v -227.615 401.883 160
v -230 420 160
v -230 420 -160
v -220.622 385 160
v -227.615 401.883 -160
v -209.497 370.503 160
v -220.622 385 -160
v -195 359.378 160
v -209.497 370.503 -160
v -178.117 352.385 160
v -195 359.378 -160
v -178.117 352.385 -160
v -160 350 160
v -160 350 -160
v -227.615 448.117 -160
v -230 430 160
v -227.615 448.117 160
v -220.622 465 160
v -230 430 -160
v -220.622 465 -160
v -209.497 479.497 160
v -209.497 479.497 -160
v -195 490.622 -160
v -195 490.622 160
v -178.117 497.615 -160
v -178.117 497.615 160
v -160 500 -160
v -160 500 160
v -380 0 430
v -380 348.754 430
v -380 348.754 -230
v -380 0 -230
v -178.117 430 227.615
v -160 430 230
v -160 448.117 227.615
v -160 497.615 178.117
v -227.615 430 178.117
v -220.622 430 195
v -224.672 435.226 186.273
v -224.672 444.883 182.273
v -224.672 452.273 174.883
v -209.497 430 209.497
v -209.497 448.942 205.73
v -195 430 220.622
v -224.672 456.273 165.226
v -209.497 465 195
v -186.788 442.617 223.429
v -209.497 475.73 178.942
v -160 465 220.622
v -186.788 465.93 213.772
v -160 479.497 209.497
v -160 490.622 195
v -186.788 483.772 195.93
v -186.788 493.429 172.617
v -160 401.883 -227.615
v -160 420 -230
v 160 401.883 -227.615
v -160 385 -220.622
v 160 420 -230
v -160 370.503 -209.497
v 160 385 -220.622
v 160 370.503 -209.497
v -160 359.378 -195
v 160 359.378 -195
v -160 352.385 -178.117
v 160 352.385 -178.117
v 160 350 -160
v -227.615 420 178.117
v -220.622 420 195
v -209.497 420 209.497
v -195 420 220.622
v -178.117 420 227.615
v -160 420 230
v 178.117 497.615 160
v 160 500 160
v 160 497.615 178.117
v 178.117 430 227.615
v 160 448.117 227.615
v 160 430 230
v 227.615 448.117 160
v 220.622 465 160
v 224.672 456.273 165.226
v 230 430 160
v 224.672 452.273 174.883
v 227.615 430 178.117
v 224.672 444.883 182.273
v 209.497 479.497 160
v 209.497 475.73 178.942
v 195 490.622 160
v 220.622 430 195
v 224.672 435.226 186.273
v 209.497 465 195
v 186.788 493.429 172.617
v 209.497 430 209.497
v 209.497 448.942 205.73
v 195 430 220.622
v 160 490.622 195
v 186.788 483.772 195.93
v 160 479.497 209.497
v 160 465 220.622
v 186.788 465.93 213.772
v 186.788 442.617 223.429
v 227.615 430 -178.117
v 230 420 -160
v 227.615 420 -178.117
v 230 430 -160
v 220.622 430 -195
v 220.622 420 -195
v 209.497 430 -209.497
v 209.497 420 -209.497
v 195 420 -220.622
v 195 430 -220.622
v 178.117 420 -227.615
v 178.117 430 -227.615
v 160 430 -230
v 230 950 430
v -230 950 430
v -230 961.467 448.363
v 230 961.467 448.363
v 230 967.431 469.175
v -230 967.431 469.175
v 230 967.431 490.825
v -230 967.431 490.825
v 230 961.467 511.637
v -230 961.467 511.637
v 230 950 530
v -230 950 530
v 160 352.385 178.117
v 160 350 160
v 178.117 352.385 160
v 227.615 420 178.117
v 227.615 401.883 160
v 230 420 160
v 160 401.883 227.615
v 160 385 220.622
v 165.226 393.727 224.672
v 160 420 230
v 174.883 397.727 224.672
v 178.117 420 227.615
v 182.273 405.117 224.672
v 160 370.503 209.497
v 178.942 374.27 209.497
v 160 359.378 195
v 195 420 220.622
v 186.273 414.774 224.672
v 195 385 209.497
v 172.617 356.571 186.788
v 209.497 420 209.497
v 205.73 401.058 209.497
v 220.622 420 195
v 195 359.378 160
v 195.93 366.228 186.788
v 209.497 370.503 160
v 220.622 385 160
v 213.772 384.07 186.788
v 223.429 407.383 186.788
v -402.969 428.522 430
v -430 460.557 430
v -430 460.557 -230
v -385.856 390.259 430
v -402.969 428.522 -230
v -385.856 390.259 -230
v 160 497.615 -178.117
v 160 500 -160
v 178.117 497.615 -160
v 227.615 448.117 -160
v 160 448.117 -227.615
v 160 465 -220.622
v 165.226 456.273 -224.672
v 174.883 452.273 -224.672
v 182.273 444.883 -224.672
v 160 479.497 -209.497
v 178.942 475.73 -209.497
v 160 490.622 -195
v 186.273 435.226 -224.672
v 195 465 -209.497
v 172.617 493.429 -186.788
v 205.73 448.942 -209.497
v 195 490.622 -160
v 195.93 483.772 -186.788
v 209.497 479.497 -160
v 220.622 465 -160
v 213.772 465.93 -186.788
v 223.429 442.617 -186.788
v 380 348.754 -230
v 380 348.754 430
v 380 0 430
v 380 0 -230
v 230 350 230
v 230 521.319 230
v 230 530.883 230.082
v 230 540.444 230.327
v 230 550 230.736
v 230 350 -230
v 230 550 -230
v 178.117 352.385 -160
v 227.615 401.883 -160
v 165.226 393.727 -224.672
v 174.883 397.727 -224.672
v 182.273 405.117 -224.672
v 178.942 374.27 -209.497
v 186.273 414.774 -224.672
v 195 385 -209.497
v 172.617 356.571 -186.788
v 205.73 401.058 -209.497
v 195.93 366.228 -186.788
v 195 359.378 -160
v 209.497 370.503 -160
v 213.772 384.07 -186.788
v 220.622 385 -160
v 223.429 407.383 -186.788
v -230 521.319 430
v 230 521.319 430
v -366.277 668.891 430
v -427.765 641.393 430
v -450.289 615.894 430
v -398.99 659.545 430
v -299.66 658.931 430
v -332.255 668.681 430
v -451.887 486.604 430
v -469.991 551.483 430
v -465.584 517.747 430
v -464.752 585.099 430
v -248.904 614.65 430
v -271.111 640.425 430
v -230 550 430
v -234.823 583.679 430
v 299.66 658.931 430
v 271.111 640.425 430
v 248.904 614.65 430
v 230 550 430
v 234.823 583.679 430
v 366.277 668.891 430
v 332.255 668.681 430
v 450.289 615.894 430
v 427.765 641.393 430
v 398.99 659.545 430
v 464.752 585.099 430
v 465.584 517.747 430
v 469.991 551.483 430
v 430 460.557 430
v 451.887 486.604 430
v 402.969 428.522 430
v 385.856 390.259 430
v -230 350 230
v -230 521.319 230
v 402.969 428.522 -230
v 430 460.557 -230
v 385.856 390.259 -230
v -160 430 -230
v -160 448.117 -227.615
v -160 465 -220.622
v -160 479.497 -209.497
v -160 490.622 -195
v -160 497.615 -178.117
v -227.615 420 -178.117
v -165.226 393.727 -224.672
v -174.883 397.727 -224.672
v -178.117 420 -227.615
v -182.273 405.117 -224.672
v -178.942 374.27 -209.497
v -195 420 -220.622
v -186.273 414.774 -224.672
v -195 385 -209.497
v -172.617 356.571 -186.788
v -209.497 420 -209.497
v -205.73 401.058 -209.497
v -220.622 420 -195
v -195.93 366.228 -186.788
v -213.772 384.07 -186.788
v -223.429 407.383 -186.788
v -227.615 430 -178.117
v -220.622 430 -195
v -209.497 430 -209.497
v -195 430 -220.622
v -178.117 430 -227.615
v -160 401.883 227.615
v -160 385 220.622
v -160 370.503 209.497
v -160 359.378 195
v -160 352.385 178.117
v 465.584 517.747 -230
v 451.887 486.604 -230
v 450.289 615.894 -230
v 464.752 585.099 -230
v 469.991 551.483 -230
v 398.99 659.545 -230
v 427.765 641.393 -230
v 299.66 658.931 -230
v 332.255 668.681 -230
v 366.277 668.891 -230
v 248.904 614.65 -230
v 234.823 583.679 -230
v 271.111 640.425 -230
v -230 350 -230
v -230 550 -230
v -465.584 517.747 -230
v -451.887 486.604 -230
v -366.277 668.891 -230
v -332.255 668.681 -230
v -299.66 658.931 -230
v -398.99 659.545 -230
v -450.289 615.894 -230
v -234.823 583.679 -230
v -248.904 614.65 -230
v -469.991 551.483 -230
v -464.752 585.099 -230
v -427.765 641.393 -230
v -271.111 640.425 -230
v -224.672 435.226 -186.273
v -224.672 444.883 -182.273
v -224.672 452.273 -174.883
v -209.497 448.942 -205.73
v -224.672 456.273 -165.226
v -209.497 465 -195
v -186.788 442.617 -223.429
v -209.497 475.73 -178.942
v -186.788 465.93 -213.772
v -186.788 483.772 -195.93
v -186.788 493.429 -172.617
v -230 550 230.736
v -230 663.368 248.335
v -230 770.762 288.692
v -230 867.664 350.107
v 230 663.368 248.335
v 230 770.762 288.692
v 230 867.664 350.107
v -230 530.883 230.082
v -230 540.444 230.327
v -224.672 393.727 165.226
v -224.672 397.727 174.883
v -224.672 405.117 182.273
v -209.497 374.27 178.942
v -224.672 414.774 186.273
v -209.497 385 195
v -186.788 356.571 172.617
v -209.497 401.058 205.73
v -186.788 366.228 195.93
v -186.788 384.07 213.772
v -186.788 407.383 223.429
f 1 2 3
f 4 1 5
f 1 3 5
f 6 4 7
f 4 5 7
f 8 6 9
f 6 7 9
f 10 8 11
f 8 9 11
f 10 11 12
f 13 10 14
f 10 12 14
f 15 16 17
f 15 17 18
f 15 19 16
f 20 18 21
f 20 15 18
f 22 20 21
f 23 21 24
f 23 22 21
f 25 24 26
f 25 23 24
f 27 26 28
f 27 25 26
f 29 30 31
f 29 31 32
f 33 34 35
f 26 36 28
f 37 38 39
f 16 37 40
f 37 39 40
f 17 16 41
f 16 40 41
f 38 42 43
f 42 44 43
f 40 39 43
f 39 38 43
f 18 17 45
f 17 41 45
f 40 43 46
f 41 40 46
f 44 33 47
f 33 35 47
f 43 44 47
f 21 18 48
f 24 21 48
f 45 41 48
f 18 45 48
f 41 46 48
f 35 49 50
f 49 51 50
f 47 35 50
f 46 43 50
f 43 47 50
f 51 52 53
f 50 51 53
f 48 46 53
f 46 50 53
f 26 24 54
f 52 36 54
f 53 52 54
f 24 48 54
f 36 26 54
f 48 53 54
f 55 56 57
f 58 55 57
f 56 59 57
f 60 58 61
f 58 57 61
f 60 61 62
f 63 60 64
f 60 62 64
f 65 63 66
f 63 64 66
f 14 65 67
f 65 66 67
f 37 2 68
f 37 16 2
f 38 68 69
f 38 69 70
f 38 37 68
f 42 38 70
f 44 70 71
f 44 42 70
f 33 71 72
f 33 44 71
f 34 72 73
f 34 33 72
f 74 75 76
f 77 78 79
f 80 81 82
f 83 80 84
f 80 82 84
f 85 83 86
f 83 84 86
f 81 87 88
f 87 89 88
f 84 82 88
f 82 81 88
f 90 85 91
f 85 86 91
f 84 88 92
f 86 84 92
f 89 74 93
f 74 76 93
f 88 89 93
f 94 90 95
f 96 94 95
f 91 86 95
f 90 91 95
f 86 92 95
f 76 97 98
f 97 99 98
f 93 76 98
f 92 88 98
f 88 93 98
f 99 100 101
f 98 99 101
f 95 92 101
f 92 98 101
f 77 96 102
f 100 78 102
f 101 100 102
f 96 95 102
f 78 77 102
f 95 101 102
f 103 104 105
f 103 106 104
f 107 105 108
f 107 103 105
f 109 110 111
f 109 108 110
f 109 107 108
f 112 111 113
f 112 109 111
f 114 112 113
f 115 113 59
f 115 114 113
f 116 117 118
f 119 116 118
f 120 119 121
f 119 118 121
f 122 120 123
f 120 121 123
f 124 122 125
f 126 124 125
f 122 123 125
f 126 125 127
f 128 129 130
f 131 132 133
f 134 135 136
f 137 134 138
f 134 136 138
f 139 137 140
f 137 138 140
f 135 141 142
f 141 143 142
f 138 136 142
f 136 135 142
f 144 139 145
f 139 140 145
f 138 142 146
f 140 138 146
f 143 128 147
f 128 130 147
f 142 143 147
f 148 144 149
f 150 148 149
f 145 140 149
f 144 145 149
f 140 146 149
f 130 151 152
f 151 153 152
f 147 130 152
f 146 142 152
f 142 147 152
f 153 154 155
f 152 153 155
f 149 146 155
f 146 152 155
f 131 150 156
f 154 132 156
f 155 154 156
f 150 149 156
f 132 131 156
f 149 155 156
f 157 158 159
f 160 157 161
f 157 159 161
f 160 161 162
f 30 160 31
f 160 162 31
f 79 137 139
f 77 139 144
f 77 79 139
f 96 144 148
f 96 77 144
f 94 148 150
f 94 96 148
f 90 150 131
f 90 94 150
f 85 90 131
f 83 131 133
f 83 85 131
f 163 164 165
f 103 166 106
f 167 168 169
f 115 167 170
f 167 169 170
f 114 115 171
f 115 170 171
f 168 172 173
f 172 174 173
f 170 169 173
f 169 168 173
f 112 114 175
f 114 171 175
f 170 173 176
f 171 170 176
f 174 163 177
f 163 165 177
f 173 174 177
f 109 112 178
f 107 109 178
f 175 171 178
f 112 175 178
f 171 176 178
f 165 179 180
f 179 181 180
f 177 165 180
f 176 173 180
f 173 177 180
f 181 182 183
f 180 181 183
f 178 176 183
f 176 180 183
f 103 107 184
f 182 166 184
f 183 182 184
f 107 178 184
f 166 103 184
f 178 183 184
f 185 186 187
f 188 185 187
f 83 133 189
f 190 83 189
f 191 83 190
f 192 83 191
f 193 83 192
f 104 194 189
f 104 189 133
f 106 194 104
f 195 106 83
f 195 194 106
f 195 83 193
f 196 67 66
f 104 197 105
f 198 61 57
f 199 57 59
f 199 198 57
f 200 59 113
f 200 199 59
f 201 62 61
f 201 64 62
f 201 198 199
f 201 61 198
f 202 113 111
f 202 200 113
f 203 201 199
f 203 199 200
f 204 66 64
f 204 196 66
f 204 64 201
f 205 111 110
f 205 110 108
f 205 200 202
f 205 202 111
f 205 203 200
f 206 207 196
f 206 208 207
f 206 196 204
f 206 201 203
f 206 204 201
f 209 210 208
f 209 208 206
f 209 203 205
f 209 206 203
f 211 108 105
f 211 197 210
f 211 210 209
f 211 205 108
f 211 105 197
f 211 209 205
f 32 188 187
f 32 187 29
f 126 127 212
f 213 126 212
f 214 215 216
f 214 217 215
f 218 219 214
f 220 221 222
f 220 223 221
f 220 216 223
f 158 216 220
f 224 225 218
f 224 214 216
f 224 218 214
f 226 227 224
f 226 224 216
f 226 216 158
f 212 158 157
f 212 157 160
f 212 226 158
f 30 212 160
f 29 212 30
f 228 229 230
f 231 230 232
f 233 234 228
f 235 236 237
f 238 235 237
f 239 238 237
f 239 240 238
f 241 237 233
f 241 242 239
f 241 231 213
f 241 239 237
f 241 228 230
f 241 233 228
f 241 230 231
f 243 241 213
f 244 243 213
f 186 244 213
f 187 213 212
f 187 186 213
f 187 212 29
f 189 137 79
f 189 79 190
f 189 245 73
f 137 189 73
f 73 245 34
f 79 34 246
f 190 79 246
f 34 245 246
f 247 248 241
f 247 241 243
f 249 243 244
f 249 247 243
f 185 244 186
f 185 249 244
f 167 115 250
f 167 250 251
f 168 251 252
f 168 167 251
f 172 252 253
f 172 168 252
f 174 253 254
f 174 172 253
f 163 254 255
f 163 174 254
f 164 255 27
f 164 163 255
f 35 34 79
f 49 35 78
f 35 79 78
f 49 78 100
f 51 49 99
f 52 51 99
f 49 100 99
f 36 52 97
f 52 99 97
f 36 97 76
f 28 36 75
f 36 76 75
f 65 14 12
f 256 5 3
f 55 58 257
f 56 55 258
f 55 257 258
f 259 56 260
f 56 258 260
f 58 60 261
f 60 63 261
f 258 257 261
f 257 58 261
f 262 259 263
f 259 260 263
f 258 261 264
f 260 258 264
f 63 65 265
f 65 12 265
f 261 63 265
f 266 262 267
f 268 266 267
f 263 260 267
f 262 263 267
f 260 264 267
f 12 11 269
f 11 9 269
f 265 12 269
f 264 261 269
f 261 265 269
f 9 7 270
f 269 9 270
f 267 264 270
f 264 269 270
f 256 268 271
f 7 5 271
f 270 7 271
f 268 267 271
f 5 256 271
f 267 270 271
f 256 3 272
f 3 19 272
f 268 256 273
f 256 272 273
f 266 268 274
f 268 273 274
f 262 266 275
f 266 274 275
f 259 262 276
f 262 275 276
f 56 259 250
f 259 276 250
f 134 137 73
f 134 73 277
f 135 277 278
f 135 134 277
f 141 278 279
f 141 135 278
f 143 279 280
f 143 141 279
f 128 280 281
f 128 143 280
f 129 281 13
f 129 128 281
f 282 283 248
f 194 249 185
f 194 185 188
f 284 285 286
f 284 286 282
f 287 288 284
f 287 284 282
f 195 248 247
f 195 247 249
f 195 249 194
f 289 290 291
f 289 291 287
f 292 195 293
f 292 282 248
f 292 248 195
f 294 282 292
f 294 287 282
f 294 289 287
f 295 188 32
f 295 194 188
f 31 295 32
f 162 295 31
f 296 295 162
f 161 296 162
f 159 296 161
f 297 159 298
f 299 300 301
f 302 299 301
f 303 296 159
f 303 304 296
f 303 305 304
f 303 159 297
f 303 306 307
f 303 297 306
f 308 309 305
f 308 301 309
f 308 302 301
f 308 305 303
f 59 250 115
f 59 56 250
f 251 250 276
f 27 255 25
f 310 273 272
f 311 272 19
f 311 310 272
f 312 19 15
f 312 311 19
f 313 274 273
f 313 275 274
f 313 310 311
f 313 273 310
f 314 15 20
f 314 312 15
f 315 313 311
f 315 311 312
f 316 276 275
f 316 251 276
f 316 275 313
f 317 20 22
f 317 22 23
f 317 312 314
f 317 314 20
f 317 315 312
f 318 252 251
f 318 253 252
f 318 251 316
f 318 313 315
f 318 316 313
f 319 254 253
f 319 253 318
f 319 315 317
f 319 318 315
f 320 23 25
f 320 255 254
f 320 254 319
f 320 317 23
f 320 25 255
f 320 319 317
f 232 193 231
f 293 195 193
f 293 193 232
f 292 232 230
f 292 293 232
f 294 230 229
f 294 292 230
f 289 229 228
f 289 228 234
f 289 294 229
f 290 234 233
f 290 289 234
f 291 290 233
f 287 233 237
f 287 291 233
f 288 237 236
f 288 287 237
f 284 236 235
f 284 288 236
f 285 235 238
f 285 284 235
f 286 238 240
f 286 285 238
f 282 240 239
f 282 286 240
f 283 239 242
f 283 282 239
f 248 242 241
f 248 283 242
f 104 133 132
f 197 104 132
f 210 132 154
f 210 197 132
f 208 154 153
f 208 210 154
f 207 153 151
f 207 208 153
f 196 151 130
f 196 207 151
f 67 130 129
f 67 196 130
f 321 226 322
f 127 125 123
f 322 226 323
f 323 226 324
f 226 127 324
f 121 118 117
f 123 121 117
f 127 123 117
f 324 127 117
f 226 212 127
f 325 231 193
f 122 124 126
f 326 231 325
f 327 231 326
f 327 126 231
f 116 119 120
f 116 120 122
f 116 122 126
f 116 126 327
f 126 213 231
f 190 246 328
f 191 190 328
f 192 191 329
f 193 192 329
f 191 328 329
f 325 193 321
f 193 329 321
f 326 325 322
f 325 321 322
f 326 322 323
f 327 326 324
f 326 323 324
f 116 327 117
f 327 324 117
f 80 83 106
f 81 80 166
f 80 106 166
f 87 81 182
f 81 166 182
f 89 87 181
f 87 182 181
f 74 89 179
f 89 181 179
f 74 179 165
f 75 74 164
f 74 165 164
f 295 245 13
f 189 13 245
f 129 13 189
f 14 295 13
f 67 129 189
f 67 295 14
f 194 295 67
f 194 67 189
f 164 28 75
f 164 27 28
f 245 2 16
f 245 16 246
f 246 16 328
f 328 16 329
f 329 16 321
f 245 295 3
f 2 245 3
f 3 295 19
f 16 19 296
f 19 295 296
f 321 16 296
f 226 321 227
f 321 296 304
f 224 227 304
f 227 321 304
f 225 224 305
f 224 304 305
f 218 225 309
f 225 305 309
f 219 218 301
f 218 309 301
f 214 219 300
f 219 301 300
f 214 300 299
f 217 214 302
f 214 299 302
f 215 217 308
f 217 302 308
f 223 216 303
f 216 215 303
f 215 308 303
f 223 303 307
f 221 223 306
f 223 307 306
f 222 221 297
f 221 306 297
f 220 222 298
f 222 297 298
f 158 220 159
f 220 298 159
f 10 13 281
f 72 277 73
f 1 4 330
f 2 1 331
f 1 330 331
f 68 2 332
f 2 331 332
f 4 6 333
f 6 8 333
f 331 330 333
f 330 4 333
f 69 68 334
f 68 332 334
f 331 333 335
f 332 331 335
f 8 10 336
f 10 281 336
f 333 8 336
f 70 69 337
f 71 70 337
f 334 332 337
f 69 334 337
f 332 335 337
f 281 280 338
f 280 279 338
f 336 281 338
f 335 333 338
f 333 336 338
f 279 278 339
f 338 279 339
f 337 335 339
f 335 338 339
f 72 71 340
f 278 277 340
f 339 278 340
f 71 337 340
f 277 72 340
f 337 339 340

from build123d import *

# Parameters (mm, degrees)
SKETCH2_W           = 460
SKETCH2_H           = 460
BOSS_EXTRUDE1_DEPTH = 350
SKETCH3_W           = 460
SKETCH3_H           = 460
BOSS_EXTRUDE2_DEPTH = 150
FILLET1_R           = 70
BOSS_EXTRUDE3_DEPTH = 460
BOSS_EXTRUDE4_REACH = 1254.153


with BuildPart() as part:
    # Sketch2 → Boss-Extrude1 (new body)
    with BuildSketch(Plane(origin=(0, 0, 0), x_dir=(1, 0, 0), z_dir=(0, 1, 0))):
        Rectangle(SKETCH2_W, SKETCH2_H)
    extrude(amount=BOSS_EXTRUDE1_DEPTH)



with BuildPart() as body_2:
    # Sketch3 → Boss-Extrude2 (new body)
    with BuildSketch(Plane(origin=(0, 350, 0), x_dir=(1, 0, 0), z_dir=(0, 1, 0))):
        Rectangle(SKETCH3_W, SKETCH3_H)
    extrude(amount=BOSS_EXTRUDE2_DEPTH)

    # Fillet1
    fillet1_edges = [body_2.edges().sort_by_distance(p)[0] for p in [
        (0, 500, 230),
        (230, 500, 0),
        (0, 500, -230),
        (230, 350, 0),
        (0, 350, 230),
        (-230, 350, 0),
        (0, 350, -230),
        (230, 425, -230),
        (230, 425, 230),
        (-230, 425, 230),
        (-230, 425, -230),
        (-230, 500, 0),
    ]]
    fillet(fillet1_edges, radius=FILLET1_R)


with BuildPart() as part_1:
    add(part.part)

    add(body_2.part)  # Boss-Extrude3 merges body 2
    # Sketch4 → Boss-Extrude3 (add)
    with BuildSketch(Plane.ZY.offset(230)):
        with BuildLine():
            Line((230, 0), (230, 521.319166655))
            ThreePointArc((230, 521.319166655), (282.459718261, 757.839386127), (430, 950))
            ThreePointArc((430, 950), (480, 968.18735527), (530, 950))
            Line((530, 950), (430, 521.319166655))
            Line((430, 521.319166655), (430, 0))
            Line((430, 0), (230, 0))
        make_face()
    extrude(amount=-BOSS_EXTRUDE3_DEPTH)

    # Boss-Extrude4: up to this face of the body (flat: up to its plane)
    boss_extrude4_end = Plane(part_1.part.faces().sort_by_distance((0, 260.659583327, 430))[0])
    # Sketch5 → Boss-Extrude4 (add, up to the picked face)
    with BuildSketch(Plane(origin=(0, 0, -230), x_dir=(-1, 0, 0), z_dir=(0, 0, -1)), mode=Mode.PRIVATE) as boss_extrude4_sk1:
        with BuildLine():
            Line((230, 0), (230, 550))
            ThreePointArc((230, 550), (398.989794856, 659.544511501), (430, 460.5572809))
            ThreePointArc((430, 460.5572809), (393.069360624, 409.991125595), (380, 348.753882025))
            Line((380, 348.753882025), (380, 0))
            Line((380, 0), (230, 0))
        make_face()
    boss_extrude4_tool1 = split(extrude(boss_extrude4_sk1.sketch, amount=-BOSS_EXTRUDE4_REACH, mode=Mode.PRIVATE), bisect_by=boss_extrude4_end, keep=Keep.BOTH, mode=Mode.PRIVATE)
    # Sketch5 → Boss-Extrude4 (add, up to the picked face)
    with BuildSketch(Plane(origin=(0, 0, -230), x_dir=(-1, 0, 0), z_dir=(0, 0, -1)), mode=Mode.PRIVATE) as boss_extrude4_sk2:
        with BuildLine():
            Line((-380, 0), (-230, 0))
            Line((-230, 0), (-230, 550))
            ThreePointArc((-230, 550), (-398.989794856, 659.544511501), (-430, 460.5572809))
            ThreePointArc((-430, 460.5572809), (-393.069360624, 409.991125595), (-380, 348.753882025))
            Line((-380, 348.753882025), (-380, 0))
        make_face()
    boss_extrude4_tool2 = split(extrude(boss_extrude4_sk2.sketch, amount=-BOSS_EXTRUDE4_REACH, mode=Mode.PRIVATE), bisect_by=boss_extrude4_end, keep=Keep.BOTH, mode=Mode.PRIVATE)
    add(boss_extrude4_tool1.solids().sort_by(Axis((-322.302459, 356.474998, -230), (0, 0, 1)))[0])
    add(boss_extrude4_tool2.solids().sort_by(Axis((322.302459, 356.474998, -230), (0, 0, 1)))[0])


solid = part_1.part
